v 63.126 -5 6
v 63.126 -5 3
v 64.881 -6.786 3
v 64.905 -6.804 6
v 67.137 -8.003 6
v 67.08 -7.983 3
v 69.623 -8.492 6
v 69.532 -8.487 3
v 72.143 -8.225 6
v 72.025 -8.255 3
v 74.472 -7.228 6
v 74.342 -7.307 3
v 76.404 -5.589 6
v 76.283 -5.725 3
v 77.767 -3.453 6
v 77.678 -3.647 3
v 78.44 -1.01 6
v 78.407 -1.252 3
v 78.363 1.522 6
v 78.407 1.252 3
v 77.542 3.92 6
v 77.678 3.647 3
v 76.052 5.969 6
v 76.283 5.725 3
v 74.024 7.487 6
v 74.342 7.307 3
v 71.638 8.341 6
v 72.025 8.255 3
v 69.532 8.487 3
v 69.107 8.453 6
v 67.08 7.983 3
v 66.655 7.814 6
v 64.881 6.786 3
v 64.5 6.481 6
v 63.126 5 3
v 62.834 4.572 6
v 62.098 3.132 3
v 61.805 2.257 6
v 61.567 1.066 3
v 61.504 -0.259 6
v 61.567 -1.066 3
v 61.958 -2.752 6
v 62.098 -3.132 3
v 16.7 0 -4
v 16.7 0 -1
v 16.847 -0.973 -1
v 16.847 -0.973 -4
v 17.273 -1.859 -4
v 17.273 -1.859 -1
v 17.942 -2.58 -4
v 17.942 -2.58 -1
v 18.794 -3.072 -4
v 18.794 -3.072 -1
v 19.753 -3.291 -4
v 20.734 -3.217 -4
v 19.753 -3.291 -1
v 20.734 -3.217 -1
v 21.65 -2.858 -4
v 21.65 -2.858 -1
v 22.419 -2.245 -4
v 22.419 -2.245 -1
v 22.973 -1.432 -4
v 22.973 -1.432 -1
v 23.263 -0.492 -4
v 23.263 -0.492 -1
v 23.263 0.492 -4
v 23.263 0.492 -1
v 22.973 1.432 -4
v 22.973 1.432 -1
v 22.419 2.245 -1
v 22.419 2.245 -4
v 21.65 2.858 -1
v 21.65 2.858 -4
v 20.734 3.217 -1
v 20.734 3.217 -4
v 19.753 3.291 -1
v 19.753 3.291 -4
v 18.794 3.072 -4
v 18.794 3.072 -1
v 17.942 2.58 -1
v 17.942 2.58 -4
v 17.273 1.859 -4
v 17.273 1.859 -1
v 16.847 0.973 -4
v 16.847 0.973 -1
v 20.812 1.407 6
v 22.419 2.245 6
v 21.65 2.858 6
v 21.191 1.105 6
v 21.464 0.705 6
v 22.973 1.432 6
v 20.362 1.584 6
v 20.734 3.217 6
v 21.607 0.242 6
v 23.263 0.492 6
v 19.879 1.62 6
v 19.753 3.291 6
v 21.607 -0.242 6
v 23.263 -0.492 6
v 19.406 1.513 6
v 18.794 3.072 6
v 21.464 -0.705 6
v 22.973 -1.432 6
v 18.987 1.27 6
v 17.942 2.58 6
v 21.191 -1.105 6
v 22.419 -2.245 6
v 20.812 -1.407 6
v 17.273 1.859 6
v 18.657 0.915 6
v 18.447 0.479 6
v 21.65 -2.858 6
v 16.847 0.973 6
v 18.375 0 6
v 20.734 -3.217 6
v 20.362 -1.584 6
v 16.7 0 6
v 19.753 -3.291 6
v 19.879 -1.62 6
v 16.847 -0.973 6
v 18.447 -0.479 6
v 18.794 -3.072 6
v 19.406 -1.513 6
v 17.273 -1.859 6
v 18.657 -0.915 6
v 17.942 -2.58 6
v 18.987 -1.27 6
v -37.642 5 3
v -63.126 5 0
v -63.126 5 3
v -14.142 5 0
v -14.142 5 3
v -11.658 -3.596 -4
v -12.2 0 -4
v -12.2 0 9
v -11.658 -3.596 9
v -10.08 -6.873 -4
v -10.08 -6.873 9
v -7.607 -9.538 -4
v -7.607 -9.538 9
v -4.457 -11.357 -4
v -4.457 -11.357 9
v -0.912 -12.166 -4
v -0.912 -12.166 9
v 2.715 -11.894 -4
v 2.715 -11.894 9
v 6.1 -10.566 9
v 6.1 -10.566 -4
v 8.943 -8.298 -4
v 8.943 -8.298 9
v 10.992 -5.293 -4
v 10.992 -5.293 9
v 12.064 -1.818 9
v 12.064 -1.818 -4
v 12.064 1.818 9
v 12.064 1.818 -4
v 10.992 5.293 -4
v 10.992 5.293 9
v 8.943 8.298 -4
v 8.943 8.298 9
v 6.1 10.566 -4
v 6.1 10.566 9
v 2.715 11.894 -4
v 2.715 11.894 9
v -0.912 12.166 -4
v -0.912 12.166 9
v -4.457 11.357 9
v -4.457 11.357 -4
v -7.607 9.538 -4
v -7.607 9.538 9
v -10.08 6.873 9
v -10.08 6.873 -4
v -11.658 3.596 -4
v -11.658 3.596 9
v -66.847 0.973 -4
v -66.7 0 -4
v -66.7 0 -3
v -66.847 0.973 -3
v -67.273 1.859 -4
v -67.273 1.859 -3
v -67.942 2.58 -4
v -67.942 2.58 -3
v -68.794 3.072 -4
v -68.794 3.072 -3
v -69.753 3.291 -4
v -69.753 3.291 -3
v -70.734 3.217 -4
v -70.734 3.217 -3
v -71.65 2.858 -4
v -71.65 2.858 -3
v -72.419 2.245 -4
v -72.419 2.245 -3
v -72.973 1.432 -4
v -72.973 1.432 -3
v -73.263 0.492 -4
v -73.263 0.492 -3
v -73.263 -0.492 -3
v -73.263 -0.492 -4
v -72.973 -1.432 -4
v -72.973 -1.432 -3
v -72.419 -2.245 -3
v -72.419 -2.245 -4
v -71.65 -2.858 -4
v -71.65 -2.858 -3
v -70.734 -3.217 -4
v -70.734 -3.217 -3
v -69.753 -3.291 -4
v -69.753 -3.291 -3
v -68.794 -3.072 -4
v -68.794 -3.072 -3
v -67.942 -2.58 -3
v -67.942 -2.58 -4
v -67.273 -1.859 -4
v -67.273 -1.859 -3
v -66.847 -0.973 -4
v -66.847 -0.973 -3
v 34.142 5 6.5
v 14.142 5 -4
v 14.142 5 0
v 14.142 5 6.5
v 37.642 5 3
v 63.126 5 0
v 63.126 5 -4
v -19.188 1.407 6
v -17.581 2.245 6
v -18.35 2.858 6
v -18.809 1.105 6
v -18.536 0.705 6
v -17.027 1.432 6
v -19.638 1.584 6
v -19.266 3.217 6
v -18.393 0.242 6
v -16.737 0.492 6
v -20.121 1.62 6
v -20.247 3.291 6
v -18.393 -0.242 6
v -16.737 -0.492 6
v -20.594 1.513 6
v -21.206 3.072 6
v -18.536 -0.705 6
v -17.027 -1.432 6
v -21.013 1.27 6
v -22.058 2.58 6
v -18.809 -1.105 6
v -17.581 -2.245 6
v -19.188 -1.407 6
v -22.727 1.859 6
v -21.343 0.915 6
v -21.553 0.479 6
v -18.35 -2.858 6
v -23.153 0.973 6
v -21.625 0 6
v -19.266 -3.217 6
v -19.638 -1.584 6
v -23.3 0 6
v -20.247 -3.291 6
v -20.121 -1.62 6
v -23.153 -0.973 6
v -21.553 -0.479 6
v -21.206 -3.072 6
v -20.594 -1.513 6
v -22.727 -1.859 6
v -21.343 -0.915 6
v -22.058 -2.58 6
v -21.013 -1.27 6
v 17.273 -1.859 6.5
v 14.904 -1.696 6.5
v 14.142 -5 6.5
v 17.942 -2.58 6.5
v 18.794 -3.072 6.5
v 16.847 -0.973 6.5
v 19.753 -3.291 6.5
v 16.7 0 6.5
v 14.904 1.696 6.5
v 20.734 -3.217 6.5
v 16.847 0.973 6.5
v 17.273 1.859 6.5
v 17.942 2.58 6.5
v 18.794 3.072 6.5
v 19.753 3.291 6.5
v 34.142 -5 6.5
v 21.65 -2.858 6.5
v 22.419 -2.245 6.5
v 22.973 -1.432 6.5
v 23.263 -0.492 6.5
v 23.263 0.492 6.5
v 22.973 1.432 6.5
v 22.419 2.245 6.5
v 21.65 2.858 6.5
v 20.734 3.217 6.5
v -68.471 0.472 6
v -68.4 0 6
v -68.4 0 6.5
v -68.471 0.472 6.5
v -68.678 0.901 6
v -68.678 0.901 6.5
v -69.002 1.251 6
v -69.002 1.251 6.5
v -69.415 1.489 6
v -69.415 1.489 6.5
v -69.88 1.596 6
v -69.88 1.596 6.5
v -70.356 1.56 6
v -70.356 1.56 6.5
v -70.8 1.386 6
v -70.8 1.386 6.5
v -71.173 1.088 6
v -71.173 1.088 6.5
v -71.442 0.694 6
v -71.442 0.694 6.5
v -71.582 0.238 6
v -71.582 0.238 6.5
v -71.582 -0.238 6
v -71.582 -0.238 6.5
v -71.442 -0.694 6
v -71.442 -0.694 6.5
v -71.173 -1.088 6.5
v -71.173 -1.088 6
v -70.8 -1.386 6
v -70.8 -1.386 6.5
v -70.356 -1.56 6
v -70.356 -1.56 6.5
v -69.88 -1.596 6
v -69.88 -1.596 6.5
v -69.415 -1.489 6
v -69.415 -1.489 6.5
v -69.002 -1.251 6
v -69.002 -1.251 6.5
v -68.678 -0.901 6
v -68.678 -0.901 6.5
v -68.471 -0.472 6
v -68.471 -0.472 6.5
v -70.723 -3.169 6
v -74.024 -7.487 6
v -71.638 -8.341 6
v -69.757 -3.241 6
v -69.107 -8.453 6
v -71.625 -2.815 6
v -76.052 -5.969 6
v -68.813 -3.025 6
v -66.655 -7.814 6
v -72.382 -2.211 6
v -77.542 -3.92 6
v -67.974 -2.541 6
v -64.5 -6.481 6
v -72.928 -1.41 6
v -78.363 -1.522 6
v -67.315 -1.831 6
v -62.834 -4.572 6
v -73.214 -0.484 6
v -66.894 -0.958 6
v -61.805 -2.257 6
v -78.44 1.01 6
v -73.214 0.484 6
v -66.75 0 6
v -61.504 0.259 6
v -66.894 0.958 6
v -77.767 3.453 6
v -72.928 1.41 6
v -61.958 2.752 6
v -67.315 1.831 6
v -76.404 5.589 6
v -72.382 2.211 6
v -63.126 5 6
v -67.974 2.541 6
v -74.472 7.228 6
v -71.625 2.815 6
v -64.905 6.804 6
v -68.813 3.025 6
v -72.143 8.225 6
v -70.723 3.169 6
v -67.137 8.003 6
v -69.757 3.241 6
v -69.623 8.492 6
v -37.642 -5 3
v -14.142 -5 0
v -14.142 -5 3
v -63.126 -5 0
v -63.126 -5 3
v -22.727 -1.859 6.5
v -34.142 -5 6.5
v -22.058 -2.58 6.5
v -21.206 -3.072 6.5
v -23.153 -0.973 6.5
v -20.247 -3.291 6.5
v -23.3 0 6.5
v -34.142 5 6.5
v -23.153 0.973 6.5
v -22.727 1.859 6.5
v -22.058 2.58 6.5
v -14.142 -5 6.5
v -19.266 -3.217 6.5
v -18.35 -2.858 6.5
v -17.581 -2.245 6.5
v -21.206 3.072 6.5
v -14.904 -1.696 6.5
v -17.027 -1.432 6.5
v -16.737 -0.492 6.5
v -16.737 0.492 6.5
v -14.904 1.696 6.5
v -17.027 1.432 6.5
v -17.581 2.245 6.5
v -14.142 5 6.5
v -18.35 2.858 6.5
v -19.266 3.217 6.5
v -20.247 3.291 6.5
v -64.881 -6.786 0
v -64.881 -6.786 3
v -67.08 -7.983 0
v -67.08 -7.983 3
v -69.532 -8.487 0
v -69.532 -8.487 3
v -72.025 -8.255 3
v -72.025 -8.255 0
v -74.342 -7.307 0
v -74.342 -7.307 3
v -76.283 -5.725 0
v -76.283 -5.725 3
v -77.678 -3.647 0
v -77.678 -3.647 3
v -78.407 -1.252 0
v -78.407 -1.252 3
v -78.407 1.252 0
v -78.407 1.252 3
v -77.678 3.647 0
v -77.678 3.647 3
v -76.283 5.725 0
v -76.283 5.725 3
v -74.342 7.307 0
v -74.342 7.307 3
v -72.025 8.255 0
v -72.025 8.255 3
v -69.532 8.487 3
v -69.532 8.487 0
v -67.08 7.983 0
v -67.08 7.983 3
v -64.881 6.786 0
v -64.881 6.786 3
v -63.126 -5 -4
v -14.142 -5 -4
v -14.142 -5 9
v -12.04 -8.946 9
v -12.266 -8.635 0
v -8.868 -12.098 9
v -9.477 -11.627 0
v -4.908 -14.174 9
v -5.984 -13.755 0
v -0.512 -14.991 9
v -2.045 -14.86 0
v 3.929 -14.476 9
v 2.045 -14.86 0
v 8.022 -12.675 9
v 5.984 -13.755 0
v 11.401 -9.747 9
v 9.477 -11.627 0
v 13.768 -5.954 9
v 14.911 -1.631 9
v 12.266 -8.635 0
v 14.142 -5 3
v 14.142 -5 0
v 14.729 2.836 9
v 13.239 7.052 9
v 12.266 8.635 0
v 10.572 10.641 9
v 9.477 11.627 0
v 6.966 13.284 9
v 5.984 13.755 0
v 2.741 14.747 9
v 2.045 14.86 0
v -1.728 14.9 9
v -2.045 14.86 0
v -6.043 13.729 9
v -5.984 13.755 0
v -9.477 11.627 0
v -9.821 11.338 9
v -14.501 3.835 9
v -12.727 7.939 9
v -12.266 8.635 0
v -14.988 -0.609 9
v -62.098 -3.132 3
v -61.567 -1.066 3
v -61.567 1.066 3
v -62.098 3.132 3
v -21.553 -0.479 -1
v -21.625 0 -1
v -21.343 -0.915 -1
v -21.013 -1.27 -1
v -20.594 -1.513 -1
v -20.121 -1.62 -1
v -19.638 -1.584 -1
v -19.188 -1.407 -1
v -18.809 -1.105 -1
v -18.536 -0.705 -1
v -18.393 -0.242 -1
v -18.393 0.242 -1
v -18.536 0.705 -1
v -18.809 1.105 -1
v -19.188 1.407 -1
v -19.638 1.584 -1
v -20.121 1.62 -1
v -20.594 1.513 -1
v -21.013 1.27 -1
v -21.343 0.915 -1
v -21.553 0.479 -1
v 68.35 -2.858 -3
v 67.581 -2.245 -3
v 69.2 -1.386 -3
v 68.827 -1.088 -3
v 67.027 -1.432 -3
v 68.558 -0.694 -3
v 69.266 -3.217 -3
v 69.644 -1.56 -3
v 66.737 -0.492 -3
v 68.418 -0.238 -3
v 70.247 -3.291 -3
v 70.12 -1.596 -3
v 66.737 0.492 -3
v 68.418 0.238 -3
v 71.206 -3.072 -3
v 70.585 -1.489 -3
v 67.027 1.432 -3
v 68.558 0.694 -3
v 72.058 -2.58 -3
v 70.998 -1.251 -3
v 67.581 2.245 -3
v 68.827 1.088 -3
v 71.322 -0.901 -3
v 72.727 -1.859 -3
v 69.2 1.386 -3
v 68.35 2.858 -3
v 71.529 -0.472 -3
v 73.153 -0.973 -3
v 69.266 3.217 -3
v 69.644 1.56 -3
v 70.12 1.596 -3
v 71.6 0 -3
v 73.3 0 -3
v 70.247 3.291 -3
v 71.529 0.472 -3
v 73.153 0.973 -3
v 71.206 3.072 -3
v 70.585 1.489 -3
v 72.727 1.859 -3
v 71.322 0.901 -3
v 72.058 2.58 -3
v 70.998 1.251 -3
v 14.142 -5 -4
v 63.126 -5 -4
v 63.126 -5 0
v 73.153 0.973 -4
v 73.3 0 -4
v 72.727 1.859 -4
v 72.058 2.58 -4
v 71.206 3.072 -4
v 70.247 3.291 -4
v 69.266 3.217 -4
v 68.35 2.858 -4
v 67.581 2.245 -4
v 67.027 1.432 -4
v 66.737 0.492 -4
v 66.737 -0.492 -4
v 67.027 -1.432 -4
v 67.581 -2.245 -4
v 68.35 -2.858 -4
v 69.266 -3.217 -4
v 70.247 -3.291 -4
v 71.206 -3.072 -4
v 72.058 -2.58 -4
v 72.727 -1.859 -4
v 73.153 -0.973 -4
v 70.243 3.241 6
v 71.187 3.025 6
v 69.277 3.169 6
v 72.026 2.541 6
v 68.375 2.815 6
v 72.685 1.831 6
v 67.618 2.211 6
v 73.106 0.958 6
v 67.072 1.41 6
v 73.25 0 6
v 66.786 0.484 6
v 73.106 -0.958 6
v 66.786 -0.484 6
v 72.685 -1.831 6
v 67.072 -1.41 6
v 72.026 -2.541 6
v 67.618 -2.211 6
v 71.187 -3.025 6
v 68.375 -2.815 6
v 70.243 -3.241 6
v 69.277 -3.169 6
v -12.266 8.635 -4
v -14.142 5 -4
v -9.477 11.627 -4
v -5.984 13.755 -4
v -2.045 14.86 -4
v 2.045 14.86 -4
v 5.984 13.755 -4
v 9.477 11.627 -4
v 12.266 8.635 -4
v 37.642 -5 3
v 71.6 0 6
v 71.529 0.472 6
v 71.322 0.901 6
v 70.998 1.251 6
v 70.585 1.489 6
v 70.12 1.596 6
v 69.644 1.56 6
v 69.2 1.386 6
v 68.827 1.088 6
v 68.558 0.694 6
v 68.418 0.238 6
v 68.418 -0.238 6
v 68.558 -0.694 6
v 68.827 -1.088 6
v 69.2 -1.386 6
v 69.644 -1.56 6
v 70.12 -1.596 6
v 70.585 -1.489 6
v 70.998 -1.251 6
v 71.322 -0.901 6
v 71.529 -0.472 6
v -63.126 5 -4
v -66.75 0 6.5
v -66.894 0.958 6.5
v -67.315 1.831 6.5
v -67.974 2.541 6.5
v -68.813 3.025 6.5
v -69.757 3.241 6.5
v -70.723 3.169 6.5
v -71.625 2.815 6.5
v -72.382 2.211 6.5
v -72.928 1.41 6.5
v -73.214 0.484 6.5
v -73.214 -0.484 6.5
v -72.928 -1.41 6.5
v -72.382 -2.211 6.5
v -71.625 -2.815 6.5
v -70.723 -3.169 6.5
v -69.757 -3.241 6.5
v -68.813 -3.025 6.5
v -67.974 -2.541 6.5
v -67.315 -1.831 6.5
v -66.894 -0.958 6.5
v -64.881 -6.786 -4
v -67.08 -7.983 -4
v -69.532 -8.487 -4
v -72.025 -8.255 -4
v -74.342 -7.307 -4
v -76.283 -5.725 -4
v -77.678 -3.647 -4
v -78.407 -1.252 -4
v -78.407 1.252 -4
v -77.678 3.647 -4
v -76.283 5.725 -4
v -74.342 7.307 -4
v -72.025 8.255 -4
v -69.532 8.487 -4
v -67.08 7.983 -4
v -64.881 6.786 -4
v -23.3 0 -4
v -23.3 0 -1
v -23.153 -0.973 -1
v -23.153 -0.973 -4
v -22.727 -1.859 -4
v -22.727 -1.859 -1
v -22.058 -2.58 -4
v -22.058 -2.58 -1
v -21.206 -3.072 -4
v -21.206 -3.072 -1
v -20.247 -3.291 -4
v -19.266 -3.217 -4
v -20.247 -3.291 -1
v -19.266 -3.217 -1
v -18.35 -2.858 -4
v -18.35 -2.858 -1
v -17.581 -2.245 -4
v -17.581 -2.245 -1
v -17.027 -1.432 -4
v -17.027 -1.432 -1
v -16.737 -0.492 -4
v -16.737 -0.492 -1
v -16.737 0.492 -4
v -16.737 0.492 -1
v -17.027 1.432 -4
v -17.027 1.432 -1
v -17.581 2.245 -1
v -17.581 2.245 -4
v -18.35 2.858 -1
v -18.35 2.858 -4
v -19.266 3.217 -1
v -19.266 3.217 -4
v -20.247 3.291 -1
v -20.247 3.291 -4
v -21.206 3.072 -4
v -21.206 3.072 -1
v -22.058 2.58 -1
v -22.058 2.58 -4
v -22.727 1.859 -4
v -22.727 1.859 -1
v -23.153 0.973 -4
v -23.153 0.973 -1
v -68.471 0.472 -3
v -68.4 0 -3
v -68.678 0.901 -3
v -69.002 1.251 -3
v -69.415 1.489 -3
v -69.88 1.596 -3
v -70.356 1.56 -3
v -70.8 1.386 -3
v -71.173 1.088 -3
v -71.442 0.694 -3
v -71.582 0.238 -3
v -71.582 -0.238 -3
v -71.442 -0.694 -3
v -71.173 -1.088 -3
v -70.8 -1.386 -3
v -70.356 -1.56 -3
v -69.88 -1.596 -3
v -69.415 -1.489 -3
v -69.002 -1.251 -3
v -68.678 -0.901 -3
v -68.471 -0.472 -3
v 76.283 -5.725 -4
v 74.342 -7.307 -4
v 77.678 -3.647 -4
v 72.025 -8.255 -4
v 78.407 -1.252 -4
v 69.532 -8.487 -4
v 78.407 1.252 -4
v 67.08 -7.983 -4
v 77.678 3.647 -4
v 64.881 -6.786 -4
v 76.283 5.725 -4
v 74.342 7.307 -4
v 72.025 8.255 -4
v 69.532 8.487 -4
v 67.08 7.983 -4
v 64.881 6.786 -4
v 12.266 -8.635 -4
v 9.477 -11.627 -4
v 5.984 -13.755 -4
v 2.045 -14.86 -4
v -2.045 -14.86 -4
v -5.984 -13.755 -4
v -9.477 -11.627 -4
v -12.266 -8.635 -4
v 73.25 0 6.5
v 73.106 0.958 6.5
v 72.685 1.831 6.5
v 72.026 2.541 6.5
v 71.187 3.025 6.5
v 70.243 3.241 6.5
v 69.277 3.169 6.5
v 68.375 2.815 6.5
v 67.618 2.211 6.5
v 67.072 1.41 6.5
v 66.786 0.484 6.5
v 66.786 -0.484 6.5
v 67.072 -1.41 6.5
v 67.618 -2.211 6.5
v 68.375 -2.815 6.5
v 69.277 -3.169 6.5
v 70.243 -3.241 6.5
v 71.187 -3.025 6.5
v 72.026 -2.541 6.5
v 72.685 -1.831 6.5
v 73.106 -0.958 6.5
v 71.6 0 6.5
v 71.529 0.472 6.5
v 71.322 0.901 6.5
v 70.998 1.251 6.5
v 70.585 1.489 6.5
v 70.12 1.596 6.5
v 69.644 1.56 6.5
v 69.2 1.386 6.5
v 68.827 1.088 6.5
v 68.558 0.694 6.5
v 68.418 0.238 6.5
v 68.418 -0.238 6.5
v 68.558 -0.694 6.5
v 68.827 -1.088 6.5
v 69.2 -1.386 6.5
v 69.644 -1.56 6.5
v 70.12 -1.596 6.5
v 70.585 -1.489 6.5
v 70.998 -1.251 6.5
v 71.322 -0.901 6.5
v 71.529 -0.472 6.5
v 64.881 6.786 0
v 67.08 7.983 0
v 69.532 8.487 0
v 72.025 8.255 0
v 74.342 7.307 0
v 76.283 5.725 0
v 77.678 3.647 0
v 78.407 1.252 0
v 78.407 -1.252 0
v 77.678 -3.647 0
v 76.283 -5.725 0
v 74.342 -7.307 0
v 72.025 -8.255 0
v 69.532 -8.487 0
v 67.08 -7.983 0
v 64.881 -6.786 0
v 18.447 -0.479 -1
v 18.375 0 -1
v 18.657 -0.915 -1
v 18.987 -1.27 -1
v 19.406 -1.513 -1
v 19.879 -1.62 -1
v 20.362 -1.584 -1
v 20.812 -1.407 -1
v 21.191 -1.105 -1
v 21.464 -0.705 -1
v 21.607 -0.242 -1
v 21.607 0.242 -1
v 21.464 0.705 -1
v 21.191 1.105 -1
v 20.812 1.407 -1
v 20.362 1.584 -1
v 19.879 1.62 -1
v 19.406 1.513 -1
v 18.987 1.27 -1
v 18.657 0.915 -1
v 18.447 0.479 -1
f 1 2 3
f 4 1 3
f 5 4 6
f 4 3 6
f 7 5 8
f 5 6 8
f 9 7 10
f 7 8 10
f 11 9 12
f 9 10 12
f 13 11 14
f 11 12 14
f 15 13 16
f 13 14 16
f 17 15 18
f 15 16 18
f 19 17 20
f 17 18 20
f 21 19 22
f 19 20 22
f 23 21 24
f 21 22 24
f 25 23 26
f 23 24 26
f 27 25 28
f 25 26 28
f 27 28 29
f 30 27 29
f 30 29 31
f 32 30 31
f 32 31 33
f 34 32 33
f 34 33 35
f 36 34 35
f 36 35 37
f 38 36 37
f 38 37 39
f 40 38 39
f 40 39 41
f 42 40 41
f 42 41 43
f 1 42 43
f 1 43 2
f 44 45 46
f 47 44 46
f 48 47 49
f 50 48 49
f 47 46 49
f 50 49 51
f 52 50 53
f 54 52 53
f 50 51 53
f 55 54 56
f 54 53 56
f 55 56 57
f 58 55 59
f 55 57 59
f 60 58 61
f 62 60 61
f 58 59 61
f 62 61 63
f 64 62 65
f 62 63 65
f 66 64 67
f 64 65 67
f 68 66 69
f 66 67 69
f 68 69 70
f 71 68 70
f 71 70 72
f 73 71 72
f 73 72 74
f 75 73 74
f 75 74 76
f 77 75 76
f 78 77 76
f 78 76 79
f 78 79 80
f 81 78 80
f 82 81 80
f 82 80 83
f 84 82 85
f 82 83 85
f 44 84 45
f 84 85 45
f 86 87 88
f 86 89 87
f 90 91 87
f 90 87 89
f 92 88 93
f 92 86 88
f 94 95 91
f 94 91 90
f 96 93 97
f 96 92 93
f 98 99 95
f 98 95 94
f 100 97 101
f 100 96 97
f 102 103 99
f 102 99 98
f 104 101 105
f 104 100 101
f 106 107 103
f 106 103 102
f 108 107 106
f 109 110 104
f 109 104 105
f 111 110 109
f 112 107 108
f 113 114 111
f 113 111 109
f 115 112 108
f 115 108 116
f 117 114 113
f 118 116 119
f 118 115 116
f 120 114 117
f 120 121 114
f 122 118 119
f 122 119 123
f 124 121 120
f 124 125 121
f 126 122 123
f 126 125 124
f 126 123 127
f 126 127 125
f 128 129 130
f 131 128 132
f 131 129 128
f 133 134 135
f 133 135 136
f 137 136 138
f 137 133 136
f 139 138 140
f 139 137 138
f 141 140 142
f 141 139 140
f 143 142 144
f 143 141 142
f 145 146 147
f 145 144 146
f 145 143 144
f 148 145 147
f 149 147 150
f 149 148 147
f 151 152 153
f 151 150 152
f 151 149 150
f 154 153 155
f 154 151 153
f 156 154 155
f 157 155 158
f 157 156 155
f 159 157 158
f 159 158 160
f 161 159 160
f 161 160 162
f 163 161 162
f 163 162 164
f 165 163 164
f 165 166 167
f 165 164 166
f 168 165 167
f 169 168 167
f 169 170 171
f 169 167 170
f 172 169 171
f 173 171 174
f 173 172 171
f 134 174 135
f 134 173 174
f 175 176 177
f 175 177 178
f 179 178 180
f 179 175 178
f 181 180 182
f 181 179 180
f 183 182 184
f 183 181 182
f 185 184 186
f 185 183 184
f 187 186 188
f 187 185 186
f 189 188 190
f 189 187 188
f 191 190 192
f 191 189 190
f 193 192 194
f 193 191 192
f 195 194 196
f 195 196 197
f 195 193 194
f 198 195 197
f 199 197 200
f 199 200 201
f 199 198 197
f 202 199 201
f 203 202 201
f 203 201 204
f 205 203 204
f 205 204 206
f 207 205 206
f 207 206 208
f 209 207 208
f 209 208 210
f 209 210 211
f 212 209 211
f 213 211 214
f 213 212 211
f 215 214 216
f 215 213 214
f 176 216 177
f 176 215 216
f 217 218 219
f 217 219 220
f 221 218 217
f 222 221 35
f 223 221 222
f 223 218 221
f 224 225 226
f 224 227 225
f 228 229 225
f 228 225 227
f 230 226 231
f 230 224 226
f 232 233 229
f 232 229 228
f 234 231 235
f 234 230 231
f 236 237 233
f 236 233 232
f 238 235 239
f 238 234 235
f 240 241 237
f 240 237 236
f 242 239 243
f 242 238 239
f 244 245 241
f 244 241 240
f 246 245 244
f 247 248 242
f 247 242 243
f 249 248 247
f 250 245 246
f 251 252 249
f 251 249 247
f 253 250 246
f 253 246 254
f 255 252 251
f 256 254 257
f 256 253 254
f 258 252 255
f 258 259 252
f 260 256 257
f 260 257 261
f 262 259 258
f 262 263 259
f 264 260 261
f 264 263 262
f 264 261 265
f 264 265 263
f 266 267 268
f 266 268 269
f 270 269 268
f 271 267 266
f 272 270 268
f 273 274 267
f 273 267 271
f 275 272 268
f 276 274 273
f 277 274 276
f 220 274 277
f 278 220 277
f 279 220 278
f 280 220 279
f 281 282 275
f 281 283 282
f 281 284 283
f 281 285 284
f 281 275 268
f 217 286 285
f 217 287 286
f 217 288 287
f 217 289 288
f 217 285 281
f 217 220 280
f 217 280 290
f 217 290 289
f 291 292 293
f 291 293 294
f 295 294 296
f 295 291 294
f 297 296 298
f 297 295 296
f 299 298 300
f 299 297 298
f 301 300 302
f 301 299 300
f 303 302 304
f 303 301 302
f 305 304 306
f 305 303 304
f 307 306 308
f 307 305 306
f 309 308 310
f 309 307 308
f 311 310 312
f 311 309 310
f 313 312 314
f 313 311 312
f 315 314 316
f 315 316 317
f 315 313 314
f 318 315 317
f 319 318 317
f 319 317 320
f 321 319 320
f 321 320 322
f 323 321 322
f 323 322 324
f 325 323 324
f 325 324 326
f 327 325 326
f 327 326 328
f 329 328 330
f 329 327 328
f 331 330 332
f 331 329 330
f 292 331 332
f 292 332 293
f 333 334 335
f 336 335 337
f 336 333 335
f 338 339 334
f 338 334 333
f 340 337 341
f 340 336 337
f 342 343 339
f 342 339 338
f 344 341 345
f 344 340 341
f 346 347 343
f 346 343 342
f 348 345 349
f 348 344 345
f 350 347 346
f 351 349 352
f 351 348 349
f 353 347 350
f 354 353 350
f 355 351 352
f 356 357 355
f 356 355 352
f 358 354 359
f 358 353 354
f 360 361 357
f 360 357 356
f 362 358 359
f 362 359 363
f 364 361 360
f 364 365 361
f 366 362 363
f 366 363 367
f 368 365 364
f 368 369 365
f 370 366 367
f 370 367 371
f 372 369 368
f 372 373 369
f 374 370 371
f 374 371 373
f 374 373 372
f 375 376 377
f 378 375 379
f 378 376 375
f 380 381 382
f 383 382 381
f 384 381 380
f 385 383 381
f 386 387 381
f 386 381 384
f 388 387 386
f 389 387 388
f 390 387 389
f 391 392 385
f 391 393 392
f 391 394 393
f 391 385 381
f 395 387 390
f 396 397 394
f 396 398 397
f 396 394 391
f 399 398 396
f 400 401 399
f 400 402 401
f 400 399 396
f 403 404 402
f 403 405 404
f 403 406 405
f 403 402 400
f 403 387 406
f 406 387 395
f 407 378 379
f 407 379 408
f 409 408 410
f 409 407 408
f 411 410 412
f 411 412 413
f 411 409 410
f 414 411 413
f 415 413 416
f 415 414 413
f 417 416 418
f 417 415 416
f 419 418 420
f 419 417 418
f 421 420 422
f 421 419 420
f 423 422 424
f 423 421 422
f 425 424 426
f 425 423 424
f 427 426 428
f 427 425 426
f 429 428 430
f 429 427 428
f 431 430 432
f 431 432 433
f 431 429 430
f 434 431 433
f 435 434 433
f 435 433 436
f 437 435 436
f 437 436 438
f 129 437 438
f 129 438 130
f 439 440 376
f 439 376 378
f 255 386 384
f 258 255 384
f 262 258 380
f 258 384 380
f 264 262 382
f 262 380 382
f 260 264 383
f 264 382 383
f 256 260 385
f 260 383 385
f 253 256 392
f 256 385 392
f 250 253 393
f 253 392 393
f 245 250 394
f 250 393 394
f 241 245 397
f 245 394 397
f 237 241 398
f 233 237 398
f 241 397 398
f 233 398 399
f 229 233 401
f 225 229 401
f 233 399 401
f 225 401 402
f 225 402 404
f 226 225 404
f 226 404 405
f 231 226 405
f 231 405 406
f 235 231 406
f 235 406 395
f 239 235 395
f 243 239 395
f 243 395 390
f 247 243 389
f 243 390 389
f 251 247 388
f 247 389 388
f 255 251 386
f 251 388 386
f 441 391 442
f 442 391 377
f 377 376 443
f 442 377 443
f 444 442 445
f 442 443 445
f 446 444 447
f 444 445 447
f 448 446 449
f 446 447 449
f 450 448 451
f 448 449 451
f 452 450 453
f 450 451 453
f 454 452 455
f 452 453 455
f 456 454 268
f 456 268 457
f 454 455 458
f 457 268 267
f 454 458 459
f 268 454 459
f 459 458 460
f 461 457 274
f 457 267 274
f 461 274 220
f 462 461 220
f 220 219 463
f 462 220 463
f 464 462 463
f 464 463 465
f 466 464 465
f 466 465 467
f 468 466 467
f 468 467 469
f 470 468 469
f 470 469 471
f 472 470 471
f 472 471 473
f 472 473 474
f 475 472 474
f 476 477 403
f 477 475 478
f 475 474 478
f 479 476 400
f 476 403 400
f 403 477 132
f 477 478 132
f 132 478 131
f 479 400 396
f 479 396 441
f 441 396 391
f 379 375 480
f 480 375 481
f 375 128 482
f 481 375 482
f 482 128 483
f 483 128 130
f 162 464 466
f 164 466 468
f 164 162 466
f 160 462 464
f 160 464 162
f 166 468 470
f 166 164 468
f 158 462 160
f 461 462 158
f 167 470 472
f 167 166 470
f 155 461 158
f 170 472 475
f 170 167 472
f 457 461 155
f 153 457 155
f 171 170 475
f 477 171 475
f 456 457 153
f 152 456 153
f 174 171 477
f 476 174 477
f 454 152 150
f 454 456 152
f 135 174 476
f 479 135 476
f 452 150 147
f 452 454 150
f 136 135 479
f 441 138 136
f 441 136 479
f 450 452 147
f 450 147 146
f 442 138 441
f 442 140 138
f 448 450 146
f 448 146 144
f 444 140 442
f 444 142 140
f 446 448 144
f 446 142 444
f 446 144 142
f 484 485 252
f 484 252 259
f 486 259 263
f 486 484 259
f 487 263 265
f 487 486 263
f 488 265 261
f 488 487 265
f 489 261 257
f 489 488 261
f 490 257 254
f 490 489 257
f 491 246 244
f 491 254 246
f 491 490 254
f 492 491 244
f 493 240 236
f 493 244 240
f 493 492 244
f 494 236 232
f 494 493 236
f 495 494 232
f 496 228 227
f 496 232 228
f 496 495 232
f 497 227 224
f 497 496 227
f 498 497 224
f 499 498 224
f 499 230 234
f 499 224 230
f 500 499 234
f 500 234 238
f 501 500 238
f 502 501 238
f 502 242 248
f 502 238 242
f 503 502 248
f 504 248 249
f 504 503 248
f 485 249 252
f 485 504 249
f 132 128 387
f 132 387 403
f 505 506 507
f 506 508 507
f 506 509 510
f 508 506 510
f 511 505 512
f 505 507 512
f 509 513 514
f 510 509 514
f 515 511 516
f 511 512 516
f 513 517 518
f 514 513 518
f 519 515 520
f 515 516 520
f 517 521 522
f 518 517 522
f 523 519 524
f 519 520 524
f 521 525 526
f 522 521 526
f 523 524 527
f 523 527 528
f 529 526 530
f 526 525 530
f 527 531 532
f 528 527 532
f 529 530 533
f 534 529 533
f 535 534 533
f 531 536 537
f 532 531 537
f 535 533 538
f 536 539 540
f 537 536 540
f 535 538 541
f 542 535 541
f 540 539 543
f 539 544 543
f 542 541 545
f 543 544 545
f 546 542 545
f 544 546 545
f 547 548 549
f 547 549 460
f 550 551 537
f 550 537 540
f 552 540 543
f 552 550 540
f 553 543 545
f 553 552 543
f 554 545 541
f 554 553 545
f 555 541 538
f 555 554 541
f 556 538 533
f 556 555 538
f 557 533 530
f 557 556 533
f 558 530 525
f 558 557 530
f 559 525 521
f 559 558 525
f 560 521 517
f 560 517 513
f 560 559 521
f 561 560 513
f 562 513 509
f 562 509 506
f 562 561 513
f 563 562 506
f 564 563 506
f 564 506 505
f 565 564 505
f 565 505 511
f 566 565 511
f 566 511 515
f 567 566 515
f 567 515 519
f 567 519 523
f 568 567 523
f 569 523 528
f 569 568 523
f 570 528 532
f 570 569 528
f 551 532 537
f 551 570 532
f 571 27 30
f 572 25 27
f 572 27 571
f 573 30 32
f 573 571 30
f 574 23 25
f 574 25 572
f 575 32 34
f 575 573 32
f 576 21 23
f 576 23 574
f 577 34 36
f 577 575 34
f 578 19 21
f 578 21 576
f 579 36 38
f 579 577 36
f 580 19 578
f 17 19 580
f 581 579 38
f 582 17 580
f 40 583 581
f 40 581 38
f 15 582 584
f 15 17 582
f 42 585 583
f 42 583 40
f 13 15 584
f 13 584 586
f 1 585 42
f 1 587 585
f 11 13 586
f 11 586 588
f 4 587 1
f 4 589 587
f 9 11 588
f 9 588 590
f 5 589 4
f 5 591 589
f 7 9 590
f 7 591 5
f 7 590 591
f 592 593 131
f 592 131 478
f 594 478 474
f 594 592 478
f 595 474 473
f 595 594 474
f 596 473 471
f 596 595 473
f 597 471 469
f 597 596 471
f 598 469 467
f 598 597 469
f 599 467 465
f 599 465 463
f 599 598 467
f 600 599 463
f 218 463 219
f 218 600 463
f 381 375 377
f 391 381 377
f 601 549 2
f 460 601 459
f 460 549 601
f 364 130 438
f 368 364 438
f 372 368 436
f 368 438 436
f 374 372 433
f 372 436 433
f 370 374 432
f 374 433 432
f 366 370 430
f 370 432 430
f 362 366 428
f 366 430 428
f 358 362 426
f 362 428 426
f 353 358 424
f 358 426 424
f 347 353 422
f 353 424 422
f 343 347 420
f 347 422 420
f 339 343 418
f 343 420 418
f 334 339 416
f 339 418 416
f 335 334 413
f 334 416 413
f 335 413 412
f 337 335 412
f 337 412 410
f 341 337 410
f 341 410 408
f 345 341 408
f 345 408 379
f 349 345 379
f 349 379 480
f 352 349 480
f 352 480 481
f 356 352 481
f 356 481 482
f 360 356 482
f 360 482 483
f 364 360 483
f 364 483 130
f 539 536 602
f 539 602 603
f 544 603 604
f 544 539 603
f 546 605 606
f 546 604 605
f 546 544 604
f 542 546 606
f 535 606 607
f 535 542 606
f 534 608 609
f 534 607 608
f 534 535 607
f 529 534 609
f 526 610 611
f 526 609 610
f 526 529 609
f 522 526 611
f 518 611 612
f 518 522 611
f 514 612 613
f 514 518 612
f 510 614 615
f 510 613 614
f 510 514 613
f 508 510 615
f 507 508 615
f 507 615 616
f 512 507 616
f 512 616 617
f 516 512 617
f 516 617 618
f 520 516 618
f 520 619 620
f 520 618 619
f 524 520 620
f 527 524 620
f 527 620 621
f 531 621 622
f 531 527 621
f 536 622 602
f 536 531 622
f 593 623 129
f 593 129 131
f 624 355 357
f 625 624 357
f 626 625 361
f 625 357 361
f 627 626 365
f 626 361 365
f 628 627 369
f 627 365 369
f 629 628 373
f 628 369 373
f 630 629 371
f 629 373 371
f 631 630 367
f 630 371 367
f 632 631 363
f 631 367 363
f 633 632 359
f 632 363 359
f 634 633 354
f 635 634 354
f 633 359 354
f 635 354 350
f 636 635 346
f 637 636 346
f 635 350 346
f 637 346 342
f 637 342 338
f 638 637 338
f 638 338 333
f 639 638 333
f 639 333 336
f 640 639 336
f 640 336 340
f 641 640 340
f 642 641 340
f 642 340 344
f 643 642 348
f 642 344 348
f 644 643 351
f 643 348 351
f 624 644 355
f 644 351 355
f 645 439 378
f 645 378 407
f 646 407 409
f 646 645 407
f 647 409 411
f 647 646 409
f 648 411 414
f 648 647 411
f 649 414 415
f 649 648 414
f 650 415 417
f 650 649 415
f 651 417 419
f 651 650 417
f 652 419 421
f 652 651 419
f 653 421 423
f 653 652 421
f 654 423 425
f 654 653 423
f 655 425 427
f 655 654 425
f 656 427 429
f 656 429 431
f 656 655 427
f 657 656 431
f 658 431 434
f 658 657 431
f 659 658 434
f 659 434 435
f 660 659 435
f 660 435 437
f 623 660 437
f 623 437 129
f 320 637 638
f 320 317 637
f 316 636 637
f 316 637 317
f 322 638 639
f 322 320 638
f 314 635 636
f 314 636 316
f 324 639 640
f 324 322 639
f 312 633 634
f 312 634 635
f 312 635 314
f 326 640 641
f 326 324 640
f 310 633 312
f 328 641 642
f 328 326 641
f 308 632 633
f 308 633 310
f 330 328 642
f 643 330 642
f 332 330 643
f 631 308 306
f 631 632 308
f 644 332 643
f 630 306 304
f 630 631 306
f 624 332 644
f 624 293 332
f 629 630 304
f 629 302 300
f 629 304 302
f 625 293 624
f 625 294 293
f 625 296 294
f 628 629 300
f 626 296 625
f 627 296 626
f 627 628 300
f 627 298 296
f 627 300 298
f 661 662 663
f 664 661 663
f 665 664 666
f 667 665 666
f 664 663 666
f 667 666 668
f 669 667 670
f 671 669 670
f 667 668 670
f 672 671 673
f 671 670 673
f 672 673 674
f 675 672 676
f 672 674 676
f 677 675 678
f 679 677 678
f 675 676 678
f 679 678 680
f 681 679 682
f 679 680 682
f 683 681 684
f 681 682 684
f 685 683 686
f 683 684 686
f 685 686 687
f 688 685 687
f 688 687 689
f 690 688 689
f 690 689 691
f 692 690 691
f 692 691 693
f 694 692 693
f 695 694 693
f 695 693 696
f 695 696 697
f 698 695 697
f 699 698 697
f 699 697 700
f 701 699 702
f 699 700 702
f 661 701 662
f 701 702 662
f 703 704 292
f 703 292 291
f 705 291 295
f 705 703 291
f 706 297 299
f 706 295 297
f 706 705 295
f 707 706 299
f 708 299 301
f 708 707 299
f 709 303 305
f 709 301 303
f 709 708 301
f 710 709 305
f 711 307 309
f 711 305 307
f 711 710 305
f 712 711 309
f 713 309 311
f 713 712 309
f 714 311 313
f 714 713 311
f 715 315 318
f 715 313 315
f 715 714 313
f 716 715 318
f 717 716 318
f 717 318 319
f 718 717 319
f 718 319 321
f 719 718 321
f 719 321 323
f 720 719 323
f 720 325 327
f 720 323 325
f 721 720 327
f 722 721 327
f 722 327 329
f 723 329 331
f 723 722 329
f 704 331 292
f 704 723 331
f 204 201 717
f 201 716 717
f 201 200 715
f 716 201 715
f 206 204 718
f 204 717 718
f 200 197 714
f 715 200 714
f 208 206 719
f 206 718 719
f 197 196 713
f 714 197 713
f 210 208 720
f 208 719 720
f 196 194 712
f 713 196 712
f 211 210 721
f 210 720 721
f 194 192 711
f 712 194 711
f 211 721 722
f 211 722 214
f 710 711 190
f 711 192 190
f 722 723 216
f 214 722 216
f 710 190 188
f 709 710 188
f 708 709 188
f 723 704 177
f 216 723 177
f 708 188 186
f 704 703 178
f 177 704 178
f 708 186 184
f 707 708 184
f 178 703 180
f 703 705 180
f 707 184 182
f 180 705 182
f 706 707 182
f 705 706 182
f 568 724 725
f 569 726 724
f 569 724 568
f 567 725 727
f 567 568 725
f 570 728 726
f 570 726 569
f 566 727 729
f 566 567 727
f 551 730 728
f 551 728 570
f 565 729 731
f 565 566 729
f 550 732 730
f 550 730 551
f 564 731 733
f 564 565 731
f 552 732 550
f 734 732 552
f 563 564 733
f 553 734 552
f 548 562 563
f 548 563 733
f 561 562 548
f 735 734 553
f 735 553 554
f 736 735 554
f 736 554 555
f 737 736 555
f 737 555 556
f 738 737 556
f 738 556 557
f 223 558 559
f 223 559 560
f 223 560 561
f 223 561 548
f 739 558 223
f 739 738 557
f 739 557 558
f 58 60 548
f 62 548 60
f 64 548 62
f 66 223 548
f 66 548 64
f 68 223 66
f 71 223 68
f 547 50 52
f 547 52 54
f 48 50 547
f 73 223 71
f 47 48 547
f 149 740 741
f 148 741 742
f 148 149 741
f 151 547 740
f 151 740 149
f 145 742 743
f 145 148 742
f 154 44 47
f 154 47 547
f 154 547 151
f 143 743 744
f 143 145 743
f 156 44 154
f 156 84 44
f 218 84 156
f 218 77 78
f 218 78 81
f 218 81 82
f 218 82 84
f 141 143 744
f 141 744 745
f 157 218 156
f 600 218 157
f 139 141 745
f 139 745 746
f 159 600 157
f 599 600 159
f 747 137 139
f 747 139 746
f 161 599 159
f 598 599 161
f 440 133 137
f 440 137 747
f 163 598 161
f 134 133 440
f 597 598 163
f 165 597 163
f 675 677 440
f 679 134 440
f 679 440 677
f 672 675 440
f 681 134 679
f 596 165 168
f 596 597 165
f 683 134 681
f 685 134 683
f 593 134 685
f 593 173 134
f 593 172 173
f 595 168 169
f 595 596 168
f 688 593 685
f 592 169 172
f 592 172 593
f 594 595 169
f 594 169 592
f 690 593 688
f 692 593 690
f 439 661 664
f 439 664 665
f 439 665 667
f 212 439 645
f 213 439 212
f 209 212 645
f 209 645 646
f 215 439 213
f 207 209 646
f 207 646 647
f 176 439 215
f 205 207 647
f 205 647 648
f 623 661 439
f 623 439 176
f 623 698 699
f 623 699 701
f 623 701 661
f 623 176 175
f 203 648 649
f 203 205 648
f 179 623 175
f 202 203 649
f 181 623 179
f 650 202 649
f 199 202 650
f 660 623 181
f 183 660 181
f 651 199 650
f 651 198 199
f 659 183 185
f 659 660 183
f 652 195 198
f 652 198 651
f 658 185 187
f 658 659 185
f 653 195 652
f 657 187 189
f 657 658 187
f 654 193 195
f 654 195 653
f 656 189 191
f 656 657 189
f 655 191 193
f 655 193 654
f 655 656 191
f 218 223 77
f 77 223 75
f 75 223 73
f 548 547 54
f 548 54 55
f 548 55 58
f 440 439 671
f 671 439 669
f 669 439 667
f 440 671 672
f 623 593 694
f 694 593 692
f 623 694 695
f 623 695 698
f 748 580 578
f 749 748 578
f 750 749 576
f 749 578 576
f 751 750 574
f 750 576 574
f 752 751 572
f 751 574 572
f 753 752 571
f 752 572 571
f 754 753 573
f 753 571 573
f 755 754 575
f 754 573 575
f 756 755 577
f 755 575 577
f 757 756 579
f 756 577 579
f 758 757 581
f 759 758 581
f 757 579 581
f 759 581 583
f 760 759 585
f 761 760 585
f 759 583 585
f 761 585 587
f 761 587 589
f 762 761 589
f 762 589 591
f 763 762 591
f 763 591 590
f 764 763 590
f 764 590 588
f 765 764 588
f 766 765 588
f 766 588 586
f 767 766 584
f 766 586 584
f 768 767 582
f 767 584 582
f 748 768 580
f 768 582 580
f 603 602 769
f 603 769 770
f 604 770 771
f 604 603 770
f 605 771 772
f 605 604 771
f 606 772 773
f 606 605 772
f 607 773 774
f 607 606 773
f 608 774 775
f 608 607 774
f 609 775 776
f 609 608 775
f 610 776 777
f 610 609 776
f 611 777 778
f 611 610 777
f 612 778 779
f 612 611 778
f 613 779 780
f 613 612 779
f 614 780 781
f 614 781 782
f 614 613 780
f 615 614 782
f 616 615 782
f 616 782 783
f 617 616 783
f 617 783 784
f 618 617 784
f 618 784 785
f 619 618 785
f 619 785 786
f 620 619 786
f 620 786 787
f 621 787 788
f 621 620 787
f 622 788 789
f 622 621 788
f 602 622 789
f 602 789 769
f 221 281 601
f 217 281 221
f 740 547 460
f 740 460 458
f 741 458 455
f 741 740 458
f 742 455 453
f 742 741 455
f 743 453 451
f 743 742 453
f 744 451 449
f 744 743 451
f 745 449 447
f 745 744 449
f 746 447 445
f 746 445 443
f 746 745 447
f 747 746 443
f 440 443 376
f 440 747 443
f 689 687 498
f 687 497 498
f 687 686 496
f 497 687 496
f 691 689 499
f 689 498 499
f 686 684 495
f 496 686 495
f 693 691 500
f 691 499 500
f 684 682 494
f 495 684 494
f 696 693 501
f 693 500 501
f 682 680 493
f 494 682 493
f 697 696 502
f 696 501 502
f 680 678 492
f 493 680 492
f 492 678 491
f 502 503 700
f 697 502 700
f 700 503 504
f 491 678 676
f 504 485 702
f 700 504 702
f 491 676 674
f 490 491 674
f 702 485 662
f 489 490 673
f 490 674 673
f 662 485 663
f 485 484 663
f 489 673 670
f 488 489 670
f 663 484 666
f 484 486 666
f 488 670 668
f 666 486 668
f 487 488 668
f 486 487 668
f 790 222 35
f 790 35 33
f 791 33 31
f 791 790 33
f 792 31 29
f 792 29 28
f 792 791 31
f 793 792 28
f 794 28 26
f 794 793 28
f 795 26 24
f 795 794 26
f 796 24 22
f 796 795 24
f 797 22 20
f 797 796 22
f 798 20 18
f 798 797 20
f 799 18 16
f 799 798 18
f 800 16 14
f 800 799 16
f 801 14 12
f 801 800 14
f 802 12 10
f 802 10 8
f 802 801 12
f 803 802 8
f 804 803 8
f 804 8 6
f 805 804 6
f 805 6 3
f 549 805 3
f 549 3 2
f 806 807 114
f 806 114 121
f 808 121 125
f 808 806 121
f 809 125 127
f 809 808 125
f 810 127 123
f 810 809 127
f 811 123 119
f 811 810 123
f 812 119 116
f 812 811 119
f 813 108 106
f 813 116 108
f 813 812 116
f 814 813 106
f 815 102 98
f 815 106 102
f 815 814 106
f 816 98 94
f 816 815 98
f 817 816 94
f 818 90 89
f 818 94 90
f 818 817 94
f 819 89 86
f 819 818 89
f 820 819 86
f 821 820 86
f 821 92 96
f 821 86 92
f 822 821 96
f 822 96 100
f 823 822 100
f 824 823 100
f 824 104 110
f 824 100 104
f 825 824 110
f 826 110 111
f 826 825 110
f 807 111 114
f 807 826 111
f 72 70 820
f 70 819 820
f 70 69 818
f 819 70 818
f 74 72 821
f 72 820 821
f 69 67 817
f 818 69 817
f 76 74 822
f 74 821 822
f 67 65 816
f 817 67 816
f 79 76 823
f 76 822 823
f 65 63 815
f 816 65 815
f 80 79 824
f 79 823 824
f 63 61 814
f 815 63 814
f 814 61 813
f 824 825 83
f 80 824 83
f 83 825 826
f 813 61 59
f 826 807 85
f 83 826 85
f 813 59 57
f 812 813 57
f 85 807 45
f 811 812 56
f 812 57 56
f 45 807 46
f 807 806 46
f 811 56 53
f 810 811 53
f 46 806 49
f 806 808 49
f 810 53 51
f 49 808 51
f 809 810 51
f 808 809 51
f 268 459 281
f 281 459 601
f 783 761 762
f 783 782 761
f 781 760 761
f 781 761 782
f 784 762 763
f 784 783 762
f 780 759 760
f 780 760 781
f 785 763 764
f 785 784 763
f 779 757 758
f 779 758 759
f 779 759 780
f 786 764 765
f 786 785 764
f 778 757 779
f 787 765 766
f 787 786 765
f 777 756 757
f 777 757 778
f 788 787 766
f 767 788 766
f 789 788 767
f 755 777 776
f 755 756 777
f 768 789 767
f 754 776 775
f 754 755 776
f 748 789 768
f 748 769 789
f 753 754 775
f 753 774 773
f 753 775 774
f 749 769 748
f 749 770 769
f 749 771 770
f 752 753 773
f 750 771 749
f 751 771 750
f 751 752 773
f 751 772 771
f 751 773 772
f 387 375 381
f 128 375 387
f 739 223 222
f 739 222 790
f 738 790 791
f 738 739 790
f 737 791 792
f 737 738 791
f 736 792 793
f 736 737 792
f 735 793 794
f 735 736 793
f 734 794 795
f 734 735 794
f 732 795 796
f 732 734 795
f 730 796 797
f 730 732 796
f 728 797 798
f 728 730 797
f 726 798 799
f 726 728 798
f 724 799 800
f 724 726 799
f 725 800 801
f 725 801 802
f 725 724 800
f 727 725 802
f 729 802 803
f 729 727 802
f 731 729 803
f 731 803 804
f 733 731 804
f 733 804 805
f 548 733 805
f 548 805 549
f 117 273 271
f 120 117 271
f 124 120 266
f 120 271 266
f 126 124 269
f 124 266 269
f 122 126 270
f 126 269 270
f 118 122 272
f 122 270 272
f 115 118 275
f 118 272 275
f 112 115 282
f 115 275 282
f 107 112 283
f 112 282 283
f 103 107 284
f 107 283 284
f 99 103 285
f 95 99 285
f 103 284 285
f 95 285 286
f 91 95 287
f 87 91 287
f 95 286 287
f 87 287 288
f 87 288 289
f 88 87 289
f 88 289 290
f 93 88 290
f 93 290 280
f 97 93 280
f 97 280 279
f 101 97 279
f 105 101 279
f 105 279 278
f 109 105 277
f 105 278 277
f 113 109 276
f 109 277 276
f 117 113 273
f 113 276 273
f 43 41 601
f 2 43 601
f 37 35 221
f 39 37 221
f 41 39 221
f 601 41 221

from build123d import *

# Parameters (mm, degrees)
SKETCH2_R               = 12
BOSS_EXTRUDE1_DEPTH     = 3
SKETCH3_R               = 15
SKETCH3_R_2             = 12
BOSS_EXTRUDE2_DEPTH     = 9
BOSS_EXTRUDE5_START     = 3
SKETCH6_R               = 8.5
BOSS_EXTRUDE5_DEPTH     = 3
BOSS_EXTRUDE6_START     = 3
SKETCH8_W               = 20
SKETCH8_H               = 10
BOSS_EXTRUDE6_DEPTH     = 3.5
CHAMFER2_SIZE           = 3.5
BOSS_EXTRUDE8_START     = -4
SKETCH14_R              = 12
BOSS_EXTRUDE8_DEPTH     = 4
CUT_EXTRUDE1_DEPTH      = 81.425431301
CUT_EXTRUDE1_DEPTH_BACK = 81.425431301
SKETCH7_R               = 1.625
CUT_EXTRUDE2_DEPTH      = 81.425431301
CUT_EXTRUDE2_DEPTH_BACK = 81.425431301
SKETCH4_R               = 1.6
CUT_EXTRUDE3_START      = 6.5
SKETCH9_R               = 3.3
CUT_EXTRUDE3_DEPTH      = 0.5
CUT_EXTRUDE4_START      = -4
SKETCH10_R              = 3.3
CUT_EXTRUDE4_DEPTH      = 1
CUT_EXTRUDE5_DEPTH      = 85.425431301
CUT_EXTRUDE5_DEPTH_BACK = 81.425431301
CUT_EXTRUDE5_START      = -4
SKETCH11_R              = 12.2
BOSS_EXTRUDE7_START     = 6
SKETCH12_R              = 3.25
SKETCH12_R_2            = 1.6
BOSS_EXTRUDE7_DEPTH     = 0.5
CUT_EXTRUDE6_START      = -1
SKETCH15_R              = 3.3
CUT_EXTRUDE6_DEPTH      = 3


with BuildPart() as part:
    # Sketch2 → Boss-Extrude1 (new body)
    with BuildSketch(Plane.XY):
        with BuildLine():
            Line((14.142135624, 5), (63.126136458, 5))
            ThreePointArc((63.126136458, 5), (78.5, 0), (63.126136458, -5))
            Line((63.126136458, -5), (14.142135624, -5))
            ThreePointArc((14.142135624, -5), (0, -15), (-14.142135624, -5))
            Line((-14.142135624, -5), (-63.126136458, -5))
            ThreePointArc((-63.126136458, -5), (-78.5, 0), (-63.126136458, 5))
            Line((-63.126136458, 5), (-14.142135624, 5))
            ThreePointArc((-14.142135624, 5), (0, 15), (14.142135624, 5))
        make_face()
        Circle(SKETCH2_R, mode=Mode.SUBTRACT)
    extrude(amount=BOSS_EXTRUDE1_DEPTH)

    # Sketch3 → Boss-Extrude2 (add)
    with BuildSketch(Plane.XY):
        with Locations(Location((0, 0, 0), (0, 0, 199.471220634))):
            Circle(SKETCH3_R)
        Circle(SKETCH3_R_2, mode=Mode.SUBTRACT)
    extrude(amount=BOSS_EXTRUDE2_DEPTH)

    # Sketch6 → Boss-Extrude5 (add)
    with BuildSketch(Plane.XY.offset(BOSS_EXTRUDE5_START)):
        with Locations(Location((-70, 0, 0), (0, 0, 36.031879072))):
            Circle(SKETCH6_R)
        with Locations(Location((70, 0, 0), (0, 0, 216.031879072))):
            Circle(SKETCH6_R)
    extrude(amount=BOSS_EXTRUDE5_DEPTH)

    # Sketch8 → Boss-Extrude6 (add)
    with BuildSketch(Plane.XY.offset(BOSS_EXTRUDE6_START)):
        with Locations((-24.142135624, 0)):
            Rectangle(SKETCH8_W, SKETCH8_H)
        with Locations((24.142135624, 0)):
            Rectangle(SKETCH8_W, SKETCH8_H)
    extrude(amount=BOSS_EXTRUDE6_DEPTH)

    # Chamfer2
    chamfer2_edges = [part.edges().sort_by_distance(p)[0] for p in [
        (-34.142135624, 0, 3),
        (34.142135624, 0, 3),
    ]]
    chamfer(chamfer2_edges, length=CHAMFER2_SIZE - 0.0001)  # a hair under: the kernel refuses the full size

    # Sketch14 → Boss-Extrude8 (add)
    with BuildSketch(Plane.XY.offset(BOSS_EXTRUDE8_START)):
        with BuildLine():
            Line((14.142135624, 5), (63.126136458, 5))
            ThreePointArc((63.126136458, 5), (78.5, 0), (63.126136458, -5))
            Line((63.126136458, -5), (14.142135624, -5))
            ThreePointArc((14.142135624, -5), (0, -15), (-14.142135624, -5))
            Line((-14.142135624, -5), (-63.126136458, -5))
            ThreePointArc((-63.126136458, -5), (-78.5, 0), (-63.126136458, 5))
            Line((-63.126136458, 5), (-14.142135624, 5))
            ThreePointArc((-14.142135624, 5), (0, 15), (14.142135624, 5))
        make_face()
        Circle(SKETCH14_R, mode=Mode.SUBTRACT)
    extrude(amount=BOSS_EXTRUDE8_DEPTH)

    # Sketch7 → Cut-Extrude1 (cut, two sides: drawn at the far end of the back side and taken through both)
    with BuildSketch(Plane.XY.offset(-CUT_EXTRUDE1_DEPTH_BACK)):
        with Locations(Location((-20, 0, 0), (0, 0, 180))):
            Circle(SKETCH7_R)
        with Locations(Location((20, 0, 0), (0, 0, 180))):
            Circle(SKETCH7_R)
    extrude(amount=CUT_EXTRUDE1_DEPTH + CUT_EXTRUDE1_DEPTH_BACK, mode=Mode.SUBTRACT)

    # Sketch4 → Cut-Extrude2 (cut, two sides: drawn at the far end of the back side and taken through both)
    with BuildSketch(Plane.XY.offset(-CUT_EXTRUDE2_DEPTH_BACK)):
        with Locations((-70, 0)):
            Circle(SKETCH4_R)
        with Locations((70, 0)):
            Circle(SKETCH4_R)
    extrude(amount=CUT_EXTRUDE2_DEPTH + CUT_EXTRUDE2_DEPTH_BACK, mode=Mode.SUBTRACT)

    # Sketch9 → Cut-Extrude3 (cut)
    with BuildSketch(Plane.XY.offset(CUT_EXTRUDE3_START)):
        with Locations(Location((-20, 0, 0), (0, 0, 180))):
            Circle(SKETCH9_R)
        with Locations(Location((20, 0, 0), (0, 0, 180))):
            Circle(SKETCH9_R)
    extrude(amount=-CUT_EXTRUDE3_DEPTH, mode=Mode.SUBTRACT)

    # Sketch10 → Cut-Extrude4 (cut)
    with BuildSketch(Plane.XY.offset(CUT_EXTRUDE4_START)):
        with Locations((-70, 0)):
            Circle(SKETCH10_R)
        with Locations((70, 0)):
            Circle(SKETCH10_R)
    extrude(amount=CUT_EXTRUDE4_DEPTH, mode=Mode.SUBTRACT)

    # Sketch11 → Cut-Extrude5 (cut, two sides: drawn at the far end of the back side and taken through both)
    with BuildSketch(Plane.XY.offset(CUT_EXTRUDE5_START - CUT_EXTRUDE5_DEPTH_BACK)):
        with Locations(Location((0, 0, 0), (0, 0, 180))):
            Circle(SKETCH11_R)
    extrude(amount=CUT_EXTRUDE5_DEPTH + CUT_EXTRUDE5_DEPTH_BACK, mode=Mode.SUBTRACT)

    # Sketch12 → Boss-Extrude7 (add)
    # profile 1 of 2: a face of its own
    with BuildSketch(Plane.XY.offset(BOSS_EXTRUDE7_START)):
        with Locations((-70, 0)):
            Circle(SKETCH12_R)
        with Locations((-70, 0)):
            Circle(SKETCH12_R_2, mode=Mode.SUBTRACT)
    # profile 2 of 2: a face of its own
    with BuildSketch(Plane.XY.offset(BOSS_EXTRUDE7_START)):
        with Locations((70, 0)):
            Circle(SKETCH12_R)
        with Locations((70, 0)):
            Circle(SKETCH12_R_2, mode=Mode.SUBTRACT)
    extrude(amount=BOSS_EXTRUDE7_DEPTH)

    # Sketch15 → Cut-Extrude6 (cut)
    with BuildSketch(Plane.XY.offset(CUT_EXTRUDE6_START)):
        with Locations(Location((-20, 0, 0), (0, 0, 180))):
            Circle(SKETCH15_R)
        with Locations(Location((20, 0, 0), (0, 0, 180))):
            Circle(SKETCH15_R)
    extrude(amount=-CUT_EXTRUDE6_DEPTH, mode=Mode.SUBTRACT)


solid = part.part
